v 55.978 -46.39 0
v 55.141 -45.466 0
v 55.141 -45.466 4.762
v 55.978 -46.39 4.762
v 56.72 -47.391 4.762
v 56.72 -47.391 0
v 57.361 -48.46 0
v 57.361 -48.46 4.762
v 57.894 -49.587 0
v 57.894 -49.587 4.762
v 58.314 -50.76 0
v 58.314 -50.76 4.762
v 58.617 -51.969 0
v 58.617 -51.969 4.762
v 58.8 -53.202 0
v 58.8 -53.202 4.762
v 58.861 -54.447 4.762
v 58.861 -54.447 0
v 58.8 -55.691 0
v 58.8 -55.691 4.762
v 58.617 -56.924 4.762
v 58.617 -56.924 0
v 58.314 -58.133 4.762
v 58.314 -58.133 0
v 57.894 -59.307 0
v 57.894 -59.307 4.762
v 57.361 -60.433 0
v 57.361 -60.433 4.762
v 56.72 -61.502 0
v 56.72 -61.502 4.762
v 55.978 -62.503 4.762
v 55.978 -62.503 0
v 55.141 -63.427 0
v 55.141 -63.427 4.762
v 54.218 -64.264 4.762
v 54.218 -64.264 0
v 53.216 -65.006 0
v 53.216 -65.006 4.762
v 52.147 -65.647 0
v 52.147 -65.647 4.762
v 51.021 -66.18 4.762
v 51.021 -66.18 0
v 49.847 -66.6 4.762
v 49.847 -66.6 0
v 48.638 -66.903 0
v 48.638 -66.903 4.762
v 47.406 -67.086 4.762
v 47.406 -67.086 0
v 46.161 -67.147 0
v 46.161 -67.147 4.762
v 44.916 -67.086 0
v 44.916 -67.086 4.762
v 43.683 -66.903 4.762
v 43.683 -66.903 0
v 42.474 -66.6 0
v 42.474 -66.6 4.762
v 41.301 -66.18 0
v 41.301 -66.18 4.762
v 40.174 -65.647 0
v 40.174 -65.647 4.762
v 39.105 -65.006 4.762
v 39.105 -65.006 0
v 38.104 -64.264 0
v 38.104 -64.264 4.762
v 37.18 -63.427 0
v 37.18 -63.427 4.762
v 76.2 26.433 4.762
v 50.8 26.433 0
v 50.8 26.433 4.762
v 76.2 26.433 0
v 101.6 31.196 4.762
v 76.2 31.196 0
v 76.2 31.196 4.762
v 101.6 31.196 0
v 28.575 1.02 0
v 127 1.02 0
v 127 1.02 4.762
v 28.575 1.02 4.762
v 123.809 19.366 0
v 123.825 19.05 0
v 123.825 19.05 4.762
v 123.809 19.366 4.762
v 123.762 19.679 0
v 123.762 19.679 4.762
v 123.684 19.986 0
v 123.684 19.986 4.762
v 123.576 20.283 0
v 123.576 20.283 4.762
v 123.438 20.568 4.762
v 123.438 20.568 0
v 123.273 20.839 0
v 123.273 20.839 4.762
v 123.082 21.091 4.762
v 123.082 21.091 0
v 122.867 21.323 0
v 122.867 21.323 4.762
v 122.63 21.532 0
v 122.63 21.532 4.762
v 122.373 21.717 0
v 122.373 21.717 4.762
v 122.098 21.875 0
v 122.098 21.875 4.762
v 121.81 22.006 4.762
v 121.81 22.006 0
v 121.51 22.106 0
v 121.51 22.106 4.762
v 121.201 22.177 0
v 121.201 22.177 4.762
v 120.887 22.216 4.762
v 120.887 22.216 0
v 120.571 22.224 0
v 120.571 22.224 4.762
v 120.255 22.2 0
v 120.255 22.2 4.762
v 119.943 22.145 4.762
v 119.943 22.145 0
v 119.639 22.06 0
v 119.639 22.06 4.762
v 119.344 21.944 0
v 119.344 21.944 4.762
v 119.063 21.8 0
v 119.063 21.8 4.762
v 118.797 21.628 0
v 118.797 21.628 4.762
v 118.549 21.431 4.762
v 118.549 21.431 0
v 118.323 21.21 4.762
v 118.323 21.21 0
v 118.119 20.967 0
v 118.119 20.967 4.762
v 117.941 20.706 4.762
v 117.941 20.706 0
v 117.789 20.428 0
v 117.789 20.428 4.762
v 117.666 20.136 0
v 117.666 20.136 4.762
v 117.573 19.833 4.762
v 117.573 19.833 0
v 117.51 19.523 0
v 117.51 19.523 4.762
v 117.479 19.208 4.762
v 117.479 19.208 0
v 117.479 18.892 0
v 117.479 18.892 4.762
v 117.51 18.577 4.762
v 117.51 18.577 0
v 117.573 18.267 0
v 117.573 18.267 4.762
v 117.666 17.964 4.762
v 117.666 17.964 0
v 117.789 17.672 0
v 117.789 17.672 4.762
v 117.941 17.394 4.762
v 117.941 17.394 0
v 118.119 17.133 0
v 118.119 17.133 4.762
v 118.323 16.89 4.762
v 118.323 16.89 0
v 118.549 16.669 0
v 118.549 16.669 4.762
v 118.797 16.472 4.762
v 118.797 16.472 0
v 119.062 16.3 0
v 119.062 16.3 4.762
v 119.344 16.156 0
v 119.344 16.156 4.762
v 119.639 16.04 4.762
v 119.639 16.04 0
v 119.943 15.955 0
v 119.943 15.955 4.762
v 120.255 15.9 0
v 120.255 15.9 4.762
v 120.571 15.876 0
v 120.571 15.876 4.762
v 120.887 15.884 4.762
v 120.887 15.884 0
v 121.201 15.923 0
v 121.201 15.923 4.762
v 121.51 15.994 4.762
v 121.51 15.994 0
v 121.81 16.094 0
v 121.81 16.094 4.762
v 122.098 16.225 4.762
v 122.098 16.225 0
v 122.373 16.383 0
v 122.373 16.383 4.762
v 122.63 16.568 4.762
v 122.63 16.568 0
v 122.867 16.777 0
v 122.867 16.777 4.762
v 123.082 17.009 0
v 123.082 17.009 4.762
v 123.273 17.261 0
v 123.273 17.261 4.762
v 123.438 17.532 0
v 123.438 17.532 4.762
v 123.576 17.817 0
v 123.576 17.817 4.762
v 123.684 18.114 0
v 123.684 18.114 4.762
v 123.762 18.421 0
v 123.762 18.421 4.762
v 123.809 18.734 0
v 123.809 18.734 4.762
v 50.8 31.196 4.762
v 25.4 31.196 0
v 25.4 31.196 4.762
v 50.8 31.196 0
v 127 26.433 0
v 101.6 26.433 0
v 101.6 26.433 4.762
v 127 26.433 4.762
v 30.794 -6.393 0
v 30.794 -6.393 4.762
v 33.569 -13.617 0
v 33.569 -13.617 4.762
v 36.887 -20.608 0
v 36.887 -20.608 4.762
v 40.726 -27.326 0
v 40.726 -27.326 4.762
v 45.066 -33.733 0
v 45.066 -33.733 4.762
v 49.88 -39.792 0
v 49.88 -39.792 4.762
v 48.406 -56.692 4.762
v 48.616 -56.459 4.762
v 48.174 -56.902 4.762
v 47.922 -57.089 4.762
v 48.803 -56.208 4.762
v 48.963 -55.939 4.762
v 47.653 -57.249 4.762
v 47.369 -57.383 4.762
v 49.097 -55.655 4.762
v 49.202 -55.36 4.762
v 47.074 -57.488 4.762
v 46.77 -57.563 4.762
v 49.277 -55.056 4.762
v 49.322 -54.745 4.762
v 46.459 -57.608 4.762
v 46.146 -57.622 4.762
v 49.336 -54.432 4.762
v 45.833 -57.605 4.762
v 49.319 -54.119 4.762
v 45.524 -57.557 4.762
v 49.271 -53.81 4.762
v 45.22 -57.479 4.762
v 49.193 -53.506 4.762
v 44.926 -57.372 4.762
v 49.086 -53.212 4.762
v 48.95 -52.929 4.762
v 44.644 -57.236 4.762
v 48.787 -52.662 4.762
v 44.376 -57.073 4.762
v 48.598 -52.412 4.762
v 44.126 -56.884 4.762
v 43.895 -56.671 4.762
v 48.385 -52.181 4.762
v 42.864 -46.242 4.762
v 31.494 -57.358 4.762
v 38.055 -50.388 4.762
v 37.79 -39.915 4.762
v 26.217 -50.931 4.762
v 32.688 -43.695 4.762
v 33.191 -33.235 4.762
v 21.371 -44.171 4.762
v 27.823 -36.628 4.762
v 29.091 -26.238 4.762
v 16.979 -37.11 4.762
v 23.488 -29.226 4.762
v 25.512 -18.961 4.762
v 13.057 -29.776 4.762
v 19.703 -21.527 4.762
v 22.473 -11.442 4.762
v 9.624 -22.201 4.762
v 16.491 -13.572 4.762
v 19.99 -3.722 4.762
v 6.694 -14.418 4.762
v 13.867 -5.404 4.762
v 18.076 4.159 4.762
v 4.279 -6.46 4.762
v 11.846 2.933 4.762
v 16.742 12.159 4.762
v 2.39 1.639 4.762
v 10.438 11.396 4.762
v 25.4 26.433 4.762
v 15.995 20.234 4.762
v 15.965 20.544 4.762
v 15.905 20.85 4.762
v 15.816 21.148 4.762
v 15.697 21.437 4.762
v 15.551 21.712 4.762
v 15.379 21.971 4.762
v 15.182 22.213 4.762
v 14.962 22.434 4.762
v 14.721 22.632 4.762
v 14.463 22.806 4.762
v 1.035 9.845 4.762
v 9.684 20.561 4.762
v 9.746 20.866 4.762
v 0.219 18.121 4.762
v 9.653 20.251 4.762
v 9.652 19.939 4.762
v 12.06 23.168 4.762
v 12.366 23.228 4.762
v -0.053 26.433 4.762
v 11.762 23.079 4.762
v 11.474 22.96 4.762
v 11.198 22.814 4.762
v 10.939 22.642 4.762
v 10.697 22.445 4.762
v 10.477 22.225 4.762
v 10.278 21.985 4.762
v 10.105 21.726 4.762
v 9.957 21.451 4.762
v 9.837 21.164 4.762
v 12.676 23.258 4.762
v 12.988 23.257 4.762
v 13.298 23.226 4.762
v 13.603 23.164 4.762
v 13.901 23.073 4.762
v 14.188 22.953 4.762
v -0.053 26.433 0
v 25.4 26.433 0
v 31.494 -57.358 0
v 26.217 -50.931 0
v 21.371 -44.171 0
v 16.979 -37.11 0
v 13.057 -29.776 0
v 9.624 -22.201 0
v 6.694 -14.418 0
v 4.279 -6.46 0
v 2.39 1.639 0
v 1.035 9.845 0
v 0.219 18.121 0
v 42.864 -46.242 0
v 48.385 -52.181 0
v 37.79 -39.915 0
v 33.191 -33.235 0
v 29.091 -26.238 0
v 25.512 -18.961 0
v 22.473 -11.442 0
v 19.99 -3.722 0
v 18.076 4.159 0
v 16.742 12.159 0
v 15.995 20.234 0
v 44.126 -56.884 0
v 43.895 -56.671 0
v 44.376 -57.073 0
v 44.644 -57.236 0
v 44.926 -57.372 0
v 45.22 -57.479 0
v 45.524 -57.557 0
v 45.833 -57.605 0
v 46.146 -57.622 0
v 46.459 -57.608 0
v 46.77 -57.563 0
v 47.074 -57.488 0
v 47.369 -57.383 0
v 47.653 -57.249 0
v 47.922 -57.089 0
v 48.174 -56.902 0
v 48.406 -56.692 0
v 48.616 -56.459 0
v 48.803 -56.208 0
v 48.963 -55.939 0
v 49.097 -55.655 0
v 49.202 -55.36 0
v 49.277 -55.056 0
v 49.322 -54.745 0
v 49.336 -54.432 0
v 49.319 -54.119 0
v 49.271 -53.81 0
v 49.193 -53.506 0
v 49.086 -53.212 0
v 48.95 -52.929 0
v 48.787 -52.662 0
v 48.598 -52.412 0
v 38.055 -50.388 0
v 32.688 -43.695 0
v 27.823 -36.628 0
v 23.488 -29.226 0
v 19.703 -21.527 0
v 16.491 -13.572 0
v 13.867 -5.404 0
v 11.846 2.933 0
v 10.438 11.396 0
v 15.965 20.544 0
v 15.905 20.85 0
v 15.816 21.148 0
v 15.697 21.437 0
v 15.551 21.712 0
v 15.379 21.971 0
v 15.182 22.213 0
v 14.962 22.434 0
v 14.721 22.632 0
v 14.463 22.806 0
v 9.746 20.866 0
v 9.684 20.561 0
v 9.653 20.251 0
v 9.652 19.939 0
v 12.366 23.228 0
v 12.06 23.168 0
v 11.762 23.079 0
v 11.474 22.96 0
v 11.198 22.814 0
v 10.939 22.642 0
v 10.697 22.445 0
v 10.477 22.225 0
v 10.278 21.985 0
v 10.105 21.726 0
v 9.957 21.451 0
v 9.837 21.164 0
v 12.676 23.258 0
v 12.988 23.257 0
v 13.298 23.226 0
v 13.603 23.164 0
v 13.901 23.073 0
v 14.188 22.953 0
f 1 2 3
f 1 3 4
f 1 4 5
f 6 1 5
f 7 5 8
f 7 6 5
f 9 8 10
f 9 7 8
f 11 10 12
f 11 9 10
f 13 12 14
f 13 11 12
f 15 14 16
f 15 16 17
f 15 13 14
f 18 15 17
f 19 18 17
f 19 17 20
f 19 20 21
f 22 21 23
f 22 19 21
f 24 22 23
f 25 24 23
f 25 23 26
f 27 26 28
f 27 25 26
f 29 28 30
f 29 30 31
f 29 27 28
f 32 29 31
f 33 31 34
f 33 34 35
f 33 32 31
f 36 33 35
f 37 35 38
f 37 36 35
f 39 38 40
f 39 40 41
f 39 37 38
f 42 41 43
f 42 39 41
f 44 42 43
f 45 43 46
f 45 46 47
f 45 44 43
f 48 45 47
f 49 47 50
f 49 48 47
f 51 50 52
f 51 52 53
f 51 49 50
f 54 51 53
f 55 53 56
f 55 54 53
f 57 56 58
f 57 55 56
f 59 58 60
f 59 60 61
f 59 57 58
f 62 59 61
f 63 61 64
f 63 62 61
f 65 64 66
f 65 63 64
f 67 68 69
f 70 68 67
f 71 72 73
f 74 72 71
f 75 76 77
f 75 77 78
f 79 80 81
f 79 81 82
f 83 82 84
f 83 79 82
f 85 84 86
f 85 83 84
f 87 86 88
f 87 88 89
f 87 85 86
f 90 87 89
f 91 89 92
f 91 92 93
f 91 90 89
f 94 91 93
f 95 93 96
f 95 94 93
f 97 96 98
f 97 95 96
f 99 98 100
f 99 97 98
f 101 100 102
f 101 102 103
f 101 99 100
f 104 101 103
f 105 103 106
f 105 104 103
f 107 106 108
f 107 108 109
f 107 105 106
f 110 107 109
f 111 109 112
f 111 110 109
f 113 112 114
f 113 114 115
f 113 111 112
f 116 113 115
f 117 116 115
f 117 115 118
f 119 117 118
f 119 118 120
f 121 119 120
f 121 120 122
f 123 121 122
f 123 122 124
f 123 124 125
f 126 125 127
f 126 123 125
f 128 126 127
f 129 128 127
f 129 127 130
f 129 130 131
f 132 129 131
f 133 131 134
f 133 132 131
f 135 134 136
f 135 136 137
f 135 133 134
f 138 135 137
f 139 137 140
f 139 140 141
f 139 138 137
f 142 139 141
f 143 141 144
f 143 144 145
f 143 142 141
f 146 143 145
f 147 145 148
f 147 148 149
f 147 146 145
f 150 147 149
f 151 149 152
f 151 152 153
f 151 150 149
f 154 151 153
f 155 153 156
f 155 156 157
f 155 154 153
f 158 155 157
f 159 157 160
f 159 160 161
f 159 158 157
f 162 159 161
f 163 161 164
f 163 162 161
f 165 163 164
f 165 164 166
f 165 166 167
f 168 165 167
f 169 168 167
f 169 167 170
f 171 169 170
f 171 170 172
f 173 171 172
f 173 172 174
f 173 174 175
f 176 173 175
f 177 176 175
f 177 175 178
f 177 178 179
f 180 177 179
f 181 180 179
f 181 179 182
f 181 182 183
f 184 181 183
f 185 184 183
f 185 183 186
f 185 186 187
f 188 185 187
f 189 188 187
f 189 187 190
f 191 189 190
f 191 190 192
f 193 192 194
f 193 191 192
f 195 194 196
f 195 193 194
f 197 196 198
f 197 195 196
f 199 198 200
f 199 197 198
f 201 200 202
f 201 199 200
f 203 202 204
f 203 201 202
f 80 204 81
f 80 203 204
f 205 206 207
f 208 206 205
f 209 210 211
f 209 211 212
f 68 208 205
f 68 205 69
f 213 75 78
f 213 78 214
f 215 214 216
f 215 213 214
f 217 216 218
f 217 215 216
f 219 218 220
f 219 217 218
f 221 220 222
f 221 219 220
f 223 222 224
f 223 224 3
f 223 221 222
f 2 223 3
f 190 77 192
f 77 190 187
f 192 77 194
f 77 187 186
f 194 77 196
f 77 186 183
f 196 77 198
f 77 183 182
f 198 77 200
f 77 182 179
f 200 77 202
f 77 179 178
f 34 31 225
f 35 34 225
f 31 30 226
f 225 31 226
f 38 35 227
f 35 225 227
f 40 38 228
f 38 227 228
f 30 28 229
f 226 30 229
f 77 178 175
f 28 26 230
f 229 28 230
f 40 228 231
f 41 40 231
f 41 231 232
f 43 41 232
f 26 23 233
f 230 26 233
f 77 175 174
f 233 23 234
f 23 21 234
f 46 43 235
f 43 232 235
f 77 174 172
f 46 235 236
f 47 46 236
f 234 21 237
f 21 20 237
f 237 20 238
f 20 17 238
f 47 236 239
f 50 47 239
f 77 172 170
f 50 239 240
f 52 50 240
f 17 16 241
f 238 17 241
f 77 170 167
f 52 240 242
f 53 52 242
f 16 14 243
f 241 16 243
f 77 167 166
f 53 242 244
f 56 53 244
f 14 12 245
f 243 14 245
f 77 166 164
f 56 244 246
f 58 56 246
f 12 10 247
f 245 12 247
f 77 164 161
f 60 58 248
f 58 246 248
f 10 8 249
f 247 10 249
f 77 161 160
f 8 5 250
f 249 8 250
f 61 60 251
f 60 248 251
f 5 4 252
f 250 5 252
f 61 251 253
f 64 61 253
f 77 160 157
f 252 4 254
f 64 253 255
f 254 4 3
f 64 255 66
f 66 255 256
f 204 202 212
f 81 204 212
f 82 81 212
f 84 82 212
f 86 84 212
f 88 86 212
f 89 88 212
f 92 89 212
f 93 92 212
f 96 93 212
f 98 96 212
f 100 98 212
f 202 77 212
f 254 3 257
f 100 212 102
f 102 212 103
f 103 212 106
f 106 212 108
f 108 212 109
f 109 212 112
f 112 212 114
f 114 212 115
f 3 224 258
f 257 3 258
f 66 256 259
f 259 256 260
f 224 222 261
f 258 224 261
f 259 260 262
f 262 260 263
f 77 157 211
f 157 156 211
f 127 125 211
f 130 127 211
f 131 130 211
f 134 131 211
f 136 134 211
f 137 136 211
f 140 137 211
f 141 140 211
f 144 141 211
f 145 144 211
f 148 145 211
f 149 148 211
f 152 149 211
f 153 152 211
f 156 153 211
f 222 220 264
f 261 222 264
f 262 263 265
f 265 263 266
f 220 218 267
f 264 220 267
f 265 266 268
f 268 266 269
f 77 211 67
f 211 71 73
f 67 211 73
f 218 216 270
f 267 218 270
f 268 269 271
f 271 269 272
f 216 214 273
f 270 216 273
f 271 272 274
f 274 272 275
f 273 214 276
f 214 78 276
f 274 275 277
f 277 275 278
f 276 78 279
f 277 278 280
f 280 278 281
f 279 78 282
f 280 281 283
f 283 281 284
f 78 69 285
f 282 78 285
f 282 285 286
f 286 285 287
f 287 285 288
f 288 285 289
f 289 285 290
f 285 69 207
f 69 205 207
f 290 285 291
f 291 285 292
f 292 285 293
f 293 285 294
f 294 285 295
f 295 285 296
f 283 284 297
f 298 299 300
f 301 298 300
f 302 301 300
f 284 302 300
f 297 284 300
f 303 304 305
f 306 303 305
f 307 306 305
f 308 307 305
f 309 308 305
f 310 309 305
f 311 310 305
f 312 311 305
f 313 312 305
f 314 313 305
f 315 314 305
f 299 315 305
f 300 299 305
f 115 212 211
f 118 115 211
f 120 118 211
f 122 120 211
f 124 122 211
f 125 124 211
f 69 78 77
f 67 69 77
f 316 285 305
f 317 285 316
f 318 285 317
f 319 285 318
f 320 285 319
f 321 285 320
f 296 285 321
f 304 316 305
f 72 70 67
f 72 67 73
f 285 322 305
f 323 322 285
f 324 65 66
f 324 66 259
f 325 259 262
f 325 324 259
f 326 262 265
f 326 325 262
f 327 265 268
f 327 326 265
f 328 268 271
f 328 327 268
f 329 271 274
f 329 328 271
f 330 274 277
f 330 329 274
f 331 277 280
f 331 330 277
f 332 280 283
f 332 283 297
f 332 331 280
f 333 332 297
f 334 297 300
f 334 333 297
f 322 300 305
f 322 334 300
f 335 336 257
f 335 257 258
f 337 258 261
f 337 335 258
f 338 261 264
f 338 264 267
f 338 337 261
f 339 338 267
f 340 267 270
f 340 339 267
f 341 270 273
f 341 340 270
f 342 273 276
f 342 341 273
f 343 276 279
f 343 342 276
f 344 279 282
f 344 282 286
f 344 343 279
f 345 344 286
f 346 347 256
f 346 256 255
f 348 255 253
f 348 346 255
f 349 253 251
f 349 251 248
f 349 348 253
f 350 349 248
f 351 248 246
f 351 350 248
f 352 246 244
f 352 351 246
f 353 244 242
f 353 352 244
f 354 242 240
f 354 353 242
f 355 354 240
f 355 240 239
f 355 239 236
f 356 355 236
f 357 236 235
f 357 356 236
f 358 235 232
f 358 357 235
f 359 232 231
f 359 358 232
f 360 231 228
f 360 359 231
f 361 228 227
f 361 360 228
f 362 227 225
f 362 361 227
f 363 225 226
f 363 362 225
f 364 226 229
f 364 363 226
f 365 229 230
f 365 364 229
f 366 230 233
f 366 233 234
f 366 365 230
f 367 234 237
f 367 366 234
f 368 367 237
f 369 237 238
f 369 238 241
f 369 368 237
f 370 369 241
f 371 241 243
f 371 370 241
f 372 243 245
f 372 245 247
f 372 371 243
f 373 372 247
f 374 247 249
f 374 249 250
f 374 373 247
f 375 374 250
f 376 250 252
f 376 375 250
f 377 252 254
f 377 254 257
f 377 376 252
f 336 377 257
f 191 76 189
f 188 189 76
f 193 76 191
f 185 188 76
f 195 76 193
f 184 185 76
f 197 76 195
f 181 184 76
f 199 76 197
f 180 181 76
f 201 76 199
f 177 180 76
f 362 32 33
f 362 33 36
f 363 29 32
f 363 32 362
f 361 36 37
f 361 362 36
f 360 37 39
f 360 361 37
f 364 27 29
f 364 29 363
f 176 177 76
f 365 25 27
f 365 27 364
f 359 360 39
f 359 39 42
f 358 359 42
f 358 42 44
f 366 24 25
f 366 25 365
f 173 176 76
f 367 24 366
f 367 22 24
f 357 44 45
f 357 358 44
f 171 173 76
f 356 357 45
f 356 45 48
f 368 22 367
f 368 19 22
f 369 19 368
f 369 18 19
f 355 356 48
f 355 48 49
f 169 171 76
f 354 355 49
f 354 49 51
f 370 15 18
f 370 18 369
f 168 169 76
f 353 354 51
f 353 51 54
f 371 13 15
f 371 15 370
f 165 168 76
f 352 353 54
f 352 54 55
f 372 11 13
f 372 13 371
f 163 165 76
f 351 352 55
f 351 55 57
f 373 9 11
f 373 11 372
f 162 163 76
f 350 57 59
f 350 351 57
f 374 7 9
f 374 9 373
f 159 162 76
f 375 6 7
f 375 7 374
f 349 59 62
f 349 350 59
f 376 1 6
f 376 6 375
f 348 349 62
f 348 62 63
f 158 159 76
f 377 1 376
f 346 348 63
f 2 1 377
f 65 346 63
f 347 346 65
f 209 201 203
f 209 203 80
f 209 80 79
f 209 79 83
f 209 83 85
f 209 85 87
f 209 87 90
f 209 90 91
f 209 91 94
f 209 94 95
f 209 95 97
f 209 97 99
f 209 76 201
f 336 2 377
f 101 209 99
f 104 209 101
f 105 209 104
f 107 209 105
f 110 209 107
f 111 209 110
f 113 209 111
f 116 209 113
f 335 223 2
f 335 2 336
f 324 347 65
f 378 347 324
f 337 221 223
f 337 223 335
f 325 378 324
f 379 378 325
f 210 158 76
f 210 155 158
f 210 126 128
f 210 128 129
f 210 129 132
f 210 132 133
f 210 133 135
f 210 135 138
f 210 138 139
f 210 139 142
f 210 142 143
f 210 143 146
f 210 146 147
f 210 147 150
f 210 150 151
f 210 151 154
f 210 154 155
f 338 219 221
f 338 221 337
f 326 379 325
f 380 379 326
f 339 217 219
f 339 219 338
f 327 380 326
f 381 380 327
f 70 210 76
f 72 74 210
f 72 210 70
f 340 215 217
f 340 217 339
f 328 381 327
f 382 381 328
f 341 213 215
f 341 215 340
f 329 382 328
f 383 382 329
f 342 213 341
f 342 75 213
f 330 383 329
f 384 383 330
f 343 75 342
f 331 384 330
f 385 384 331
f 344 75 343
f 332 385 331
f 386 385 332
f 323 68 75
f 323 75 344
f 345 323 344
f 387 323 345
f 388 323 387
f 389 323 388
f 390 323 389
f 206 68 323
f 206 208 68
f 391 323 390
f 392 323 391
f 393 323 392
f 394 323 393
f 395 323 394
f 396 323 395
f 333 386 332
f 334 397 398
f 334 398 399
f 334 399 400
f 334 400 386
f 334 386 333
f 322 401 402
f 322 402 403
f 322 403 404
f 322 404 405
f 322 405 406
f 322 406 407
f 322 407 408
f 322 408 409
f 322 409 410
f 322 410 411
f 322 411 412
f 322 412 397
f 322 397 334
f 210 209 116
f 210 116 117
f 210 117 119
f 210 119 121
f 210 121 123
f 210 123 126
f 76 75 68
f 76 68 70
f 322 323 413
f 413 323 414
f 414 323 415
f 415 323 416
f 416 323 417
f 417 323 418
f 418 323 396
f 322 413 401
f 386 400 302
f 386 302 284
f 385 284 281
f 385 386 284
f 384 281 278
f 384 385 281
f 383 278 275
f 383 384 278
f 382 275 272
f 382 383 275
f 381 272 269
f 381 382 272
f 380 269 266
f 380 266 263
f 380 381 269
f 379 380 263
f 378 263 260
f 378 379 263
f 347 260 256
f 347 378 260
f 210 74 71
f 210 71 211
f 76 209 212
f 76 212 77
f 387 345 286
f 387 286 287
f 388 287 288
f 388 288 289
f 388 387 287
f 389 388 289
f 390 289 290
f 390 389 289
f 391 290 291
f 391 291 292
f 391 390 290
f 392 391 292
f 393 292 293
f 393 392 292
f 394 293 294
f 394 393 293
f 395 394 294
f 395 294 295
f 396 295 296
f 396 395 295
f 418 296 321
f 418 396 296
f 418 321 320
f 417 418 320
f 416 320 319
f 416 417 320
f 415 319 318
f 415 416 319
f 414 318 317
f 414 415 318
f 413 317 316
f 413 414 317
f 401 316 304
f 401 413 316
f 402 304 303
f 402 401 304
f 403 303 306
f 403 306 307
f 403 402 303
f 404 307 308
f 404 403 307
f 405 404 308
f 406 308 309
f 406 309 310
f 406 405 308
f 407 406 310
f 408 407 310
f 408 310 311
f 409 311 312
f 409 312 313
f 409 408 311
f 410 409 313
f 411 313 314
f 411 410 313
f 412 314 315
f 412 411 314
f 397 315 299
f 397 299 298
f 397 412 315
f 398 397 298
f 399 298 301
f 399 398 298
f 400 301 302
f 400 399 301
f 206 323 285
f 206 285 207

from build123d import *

# Parameters (mm, degrees)
SKETCH1_R           = 3.175
BOSS_EXTRUDE1_DEPTH = 4.7625


with BuildPart() as part:
    # Sketch1 → Boss-Extrude1 (new body)
    with BuildSketch(Plane.XY):
        with BuildLine():
            Line((50.8, 26.433162162), (76.2, 26.433162162))
            Line((76.2, 26.433162162), (76.2, 31.195662162))
            Line((76.2, 31.195662162), (101.6, 31.195662162))
            Line((101.6, 31.195662162), (101.6, 26.433162162))
            Line((101.6, 26.433162162), (127, 26.433162162))
            Line((127, 26.433162162), (127, 1.01998892))
            Line((127, 1.01998892), (28.57520326, 1.01998892))
            ThreePointArc((28.57520326, 1.01998892), (38.742465974, -24.003706053), (55.140964092, -45.46641326))
            ThreePointArc((55.140964092, -45.46641326), (55.140964092, -63.426925502), (37.180451849, -63.426925502))
            ThreePointArc((37.180451849, -63.426925502), (9.624103867, -22.201039712), (-0.05269216, 26.433162162))
            Line((-0.05269216, 26.433162162), (25.4, 26.433162162))
            Line((25.4, 26.433162162), (25.4, 31.195662162))
            Line((25.4, 31.195662162), (50.8, 31.195662162))
            Line((50.8, 31.195662162), (50.8, 26.433162162))
        make_face()
        with Locations((120.65, 19.05)):
            Circle(SKETCH1_R, mode=Mode.SUBTRACT)
        with BuildLine():
            ThreePointArc((15.995135135, 20.234189189), (12.675972973, 23.258162162), (9.652, 19.939))
            ThreePointArc((9.652, 19.939), (19.70325304, -21.526564047), (43.895465689, -56.671372149))
            ThreePointArc((43.895465689, -56.671372149), (48.405772001, -56.691733412), (48.385410738, -52.1814271))
            ThreePointArc((48.385410738, -52.1814271), (25.511627679, -18.960863581), (15.995135135, 20.234189189))
        make_face(mode=Mode.SUBTRACT)
    extrude(amount=BOSS_EXTRUDE1_DEPTH)


solid = part.part
